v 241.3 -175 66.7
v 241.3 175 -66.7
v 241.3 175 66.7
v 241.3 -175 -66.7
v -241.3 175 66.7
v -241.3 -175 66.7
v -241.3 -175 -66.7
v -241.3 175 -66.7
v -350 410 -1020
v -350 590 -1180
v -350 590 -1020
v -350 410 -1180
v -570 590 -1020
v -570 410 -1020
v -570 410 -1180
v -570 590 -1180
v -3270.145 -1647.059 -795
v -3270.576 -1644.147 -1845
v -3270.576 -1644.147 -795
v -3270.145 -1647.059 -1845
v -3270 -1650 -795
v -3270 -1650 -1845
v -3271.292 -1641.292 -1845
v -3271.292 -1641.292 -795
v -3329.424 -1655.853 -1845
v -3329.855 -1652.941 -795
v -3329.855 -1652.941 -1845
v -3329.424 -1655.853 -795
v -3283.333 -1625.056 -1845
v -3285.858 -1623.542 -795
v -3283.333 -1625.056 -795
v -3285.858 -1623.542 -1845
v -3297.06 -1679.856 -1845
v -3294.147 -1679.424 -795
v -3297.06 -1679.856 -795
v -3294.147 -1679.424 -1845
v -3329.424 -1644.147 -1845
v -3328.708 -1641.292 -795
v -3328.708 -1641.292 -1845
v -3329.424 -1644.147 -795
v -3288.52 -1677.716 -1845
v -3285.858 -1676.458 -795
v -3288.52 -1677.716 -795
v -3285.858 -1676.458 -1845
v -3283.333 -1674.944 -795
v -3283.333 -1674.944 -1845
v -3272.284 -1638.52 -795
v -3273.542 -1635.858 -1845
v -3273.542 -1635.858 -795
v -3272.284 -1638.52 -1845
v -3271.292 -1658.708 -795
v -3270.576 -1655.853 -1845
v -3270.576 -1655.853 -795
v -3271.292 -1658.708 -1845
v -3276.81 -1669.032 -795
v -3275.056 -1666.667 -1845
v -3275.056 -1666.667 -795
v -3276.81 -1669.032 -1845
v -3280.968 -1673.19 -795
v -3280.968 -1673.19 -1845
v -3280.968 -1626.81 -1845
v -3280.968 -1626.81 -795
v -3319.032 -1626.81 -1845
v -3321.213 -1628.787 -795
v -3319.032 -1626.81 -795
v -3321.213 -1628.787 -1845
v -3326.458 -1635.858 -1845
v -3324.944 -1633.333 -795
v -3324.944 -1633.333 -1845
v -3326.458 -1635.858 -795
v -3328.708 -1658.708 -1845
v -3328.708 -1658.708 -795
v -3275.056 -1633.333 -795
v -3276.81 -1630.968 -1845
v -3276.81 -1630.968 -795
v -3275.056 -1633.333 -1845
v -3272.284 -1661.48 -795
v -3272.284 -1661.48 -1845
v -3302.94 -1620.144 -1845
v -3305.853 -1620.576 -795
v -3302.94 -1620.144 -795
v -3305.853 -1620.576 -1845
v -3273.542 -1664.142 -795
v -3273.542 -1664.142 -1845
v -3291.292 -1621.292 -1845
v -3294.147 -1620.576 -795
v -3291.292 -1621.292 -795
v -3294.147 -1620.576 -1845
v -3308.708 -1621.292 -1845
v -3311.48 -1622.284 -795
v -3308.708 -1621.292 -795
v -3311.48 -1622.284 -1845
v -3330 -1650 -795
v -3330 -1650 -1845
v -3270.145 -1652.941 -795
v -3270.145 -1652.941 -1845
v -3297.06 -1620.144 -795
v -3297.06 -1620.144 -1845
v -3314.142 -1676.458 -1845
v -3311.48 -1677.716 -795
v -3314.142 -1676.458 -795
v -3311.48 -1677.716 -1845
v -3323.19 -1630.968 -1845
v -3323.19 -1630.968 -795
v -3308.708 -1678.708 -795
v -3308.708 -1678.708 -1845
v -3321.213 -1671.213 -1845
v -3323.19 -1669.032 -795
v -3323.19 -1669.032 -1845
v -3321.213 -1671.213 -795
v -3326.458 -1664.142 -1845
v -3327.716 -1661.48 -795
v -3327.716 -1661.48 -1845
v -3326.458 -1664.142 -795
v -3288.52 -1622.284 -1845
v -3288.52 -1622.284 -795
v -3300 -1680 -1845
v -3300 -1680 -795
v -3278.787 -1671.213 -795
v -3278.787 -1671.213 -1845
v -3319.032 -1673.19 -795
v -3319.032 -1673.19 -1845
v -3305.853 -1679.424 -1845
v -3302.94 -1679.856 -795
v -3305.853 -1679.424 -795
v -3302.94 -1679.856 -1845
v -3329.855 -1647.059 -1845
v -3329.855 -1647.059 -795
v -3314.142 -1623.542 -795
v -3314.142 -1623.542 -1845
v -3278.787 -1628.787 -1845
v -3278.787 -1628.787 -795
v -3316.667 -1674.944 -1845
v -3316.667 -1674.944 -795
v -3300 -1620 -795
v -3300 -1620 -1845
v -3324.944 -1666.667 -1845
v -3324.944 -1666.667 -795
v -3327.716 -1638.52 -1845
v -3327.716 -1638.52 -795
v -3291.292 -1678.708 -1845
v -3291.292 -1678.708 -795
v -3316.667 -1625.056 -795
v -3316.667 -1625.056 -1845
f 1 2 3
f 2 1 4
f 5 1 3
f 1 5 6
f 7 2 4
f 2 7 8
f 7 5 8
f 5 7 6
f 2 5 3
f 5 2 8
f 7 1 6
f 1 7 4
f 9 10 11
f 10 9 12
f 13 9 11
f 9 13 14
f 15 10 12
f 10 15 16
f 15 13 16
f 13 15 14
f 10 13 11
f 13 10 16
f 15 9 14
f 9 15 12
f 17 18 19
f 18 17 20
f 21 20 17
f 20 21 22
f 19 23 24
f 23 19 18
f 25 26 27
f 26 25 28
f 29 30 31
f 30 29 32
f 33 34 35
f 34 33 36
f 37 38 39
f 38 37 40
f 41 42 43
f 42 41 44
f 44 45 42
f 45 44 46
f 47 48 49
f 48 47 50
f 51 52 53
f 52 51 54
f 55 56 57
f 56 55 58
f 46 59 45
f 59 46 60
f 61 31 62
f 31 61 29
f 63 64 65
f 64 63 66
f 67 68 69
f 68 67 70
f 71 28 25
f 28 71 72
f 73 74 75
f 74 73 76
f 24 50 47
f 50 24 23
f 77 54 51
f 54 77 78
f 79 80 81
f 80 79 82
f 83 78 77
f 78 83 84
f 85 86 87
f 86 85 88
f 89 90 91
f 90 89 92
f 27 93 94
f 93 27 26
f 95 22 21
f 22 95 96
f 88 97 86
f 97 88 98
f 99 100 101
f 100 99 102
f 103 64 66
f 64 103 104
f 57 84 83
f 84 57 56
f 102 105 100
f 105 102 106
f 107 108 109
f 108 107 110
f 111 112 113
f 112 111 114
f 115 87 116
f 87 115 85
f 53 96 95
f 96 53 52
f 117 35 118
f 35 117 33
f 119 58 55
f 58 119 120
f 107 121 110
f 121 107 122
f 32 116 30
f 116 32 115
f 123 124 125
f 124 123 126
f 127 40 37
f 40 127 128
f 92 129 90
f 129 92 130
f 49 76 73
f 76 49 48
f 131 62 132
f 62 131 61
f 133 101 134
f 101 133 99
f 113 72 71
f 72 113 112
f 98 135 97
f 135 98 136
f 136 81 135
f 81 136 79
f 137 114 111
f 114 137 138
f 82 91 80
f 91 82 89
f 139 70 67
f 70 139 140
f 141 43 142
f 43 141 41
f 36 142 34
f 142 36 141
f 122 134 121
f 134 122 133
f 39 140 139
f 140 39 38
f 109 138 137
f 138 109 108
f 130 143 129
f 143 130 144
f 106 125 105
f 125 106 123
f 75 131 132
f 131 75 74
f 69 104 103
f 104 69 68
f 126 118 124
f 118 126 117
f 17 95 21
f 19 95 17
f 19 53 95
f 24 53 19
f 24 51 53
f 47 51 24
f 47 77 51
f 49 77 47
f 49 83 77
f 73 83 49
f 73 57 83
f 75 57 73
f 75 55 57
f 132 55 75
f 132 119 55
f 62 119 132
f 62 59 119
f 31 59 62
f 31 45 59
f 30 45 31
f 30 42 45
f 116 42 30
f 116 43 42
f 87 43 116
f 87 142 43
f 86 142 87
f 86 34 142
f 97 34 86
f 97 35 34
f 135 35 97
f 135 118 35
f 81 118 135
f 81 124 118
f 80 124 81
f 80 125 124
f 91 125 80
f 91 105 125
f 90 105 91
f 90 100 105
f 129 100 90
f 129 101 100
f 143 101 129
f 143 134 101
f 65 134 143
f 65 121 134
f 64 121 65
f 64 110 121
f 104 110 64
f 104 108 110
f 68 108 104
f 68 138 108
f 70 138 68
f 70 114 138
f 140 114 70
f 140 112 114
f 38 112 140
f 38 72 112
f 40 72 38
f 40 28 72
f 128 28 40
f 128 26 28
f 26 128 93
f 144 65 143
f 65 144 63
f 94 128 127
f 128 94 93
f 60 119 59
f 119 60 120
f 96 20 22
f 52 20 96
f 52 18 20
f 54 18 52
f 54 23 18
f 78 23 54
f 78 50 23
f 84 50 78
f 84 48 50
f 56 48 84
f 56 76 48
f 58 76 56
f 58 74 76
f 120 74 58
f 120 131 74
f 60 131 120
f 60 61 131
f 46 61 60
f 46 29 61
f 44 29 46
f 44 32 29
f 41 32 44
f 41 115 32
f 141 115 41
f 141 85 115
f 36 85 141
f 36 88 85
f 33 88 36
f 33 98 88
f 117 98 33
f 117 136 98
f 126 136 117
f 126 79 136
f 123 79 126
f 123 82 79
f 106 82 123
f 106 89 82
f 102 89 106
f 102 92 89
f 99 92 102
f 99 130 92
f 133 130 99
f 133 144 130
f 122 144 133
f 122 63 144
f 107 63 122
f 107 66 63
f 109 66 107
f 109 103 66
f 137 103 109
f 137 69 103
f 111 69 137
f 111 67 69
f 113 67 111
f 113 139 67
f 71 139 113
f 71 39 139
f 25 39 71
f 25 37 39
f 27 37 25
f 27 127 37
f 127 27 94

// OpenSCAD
// ============================================================================
// Atom Lithography Machine — Parametric OpenSCAD Module (S7.SAFETY-03)
// ============================================================================
// part_id           : S7.SAFETY-03
// parent_bom_id     : S7.SAFETY
// subsystem         : S7
// part_name         : IEC 61508 SIL-3 1oo2D Donanimsal Emniyet PLC, 4x E-Stop Mantar, Kapak Anahtarlari & 2 MOhm HV Crowbar Modulu (Exp150, 18.0 kg)
// material          : Steel
// temp_stage        : 300 K (S7 raf ustu)
// vacuum_grade      : Atmosfer
// tolerance         : SIL-3 1oo2D, <50 ms HV
// computed_mass_kg  : 18.00000
// envelope_mm       : 4000.000 x 4000.000 x 1911.450
// design_maturity   : M0_M1_DETAILED_CAD_DESIGN_ONLY
// no_lab_measurement: true
// iec61508_certified: false
// semi_s2_certified : false
// Units: millimeters (mm)
// ============================================================================

$fn = 64;

// Nominal bounding envelope parameters (mm)
bbox_x = 4000.0000;
bbox_y = 4000.0000;
bbox_z = 1911.4500;

// Part-specific parametric dimensions
plc_u = 3;
estop_corner_mm = 1900.0;
crowbar_mohm = 2.0;

// Interface / port parameters (mm)

module part_S7_SAFETY_03() {
  union() {
    // 3U 1oo2D safety PLC chassis (Bay 1 U39-U41)
    cube([482.600, 350.000, 133.400], center=true);
    // Active 2 MOhm HV crowbar dump box
    translate([-460.000, 500.000, -1100.000]) cube([220.000, 180.000, 160.000], center=true);
    // Representative corner E-Stop pedestal
    translate([-3300.000, -1650.000, -1320.000]) cylinder(d=60.000, h=1050.000, center=true);
  }
}

// World assembly mounting transform (global machine frame, mm / deg):
// translate([1480.000, -263.000, 1845.775]) rotate([0.000, 0.000, 0.000]) part_S7_SAFETY_03();

part_S7_SAFETY_03();
